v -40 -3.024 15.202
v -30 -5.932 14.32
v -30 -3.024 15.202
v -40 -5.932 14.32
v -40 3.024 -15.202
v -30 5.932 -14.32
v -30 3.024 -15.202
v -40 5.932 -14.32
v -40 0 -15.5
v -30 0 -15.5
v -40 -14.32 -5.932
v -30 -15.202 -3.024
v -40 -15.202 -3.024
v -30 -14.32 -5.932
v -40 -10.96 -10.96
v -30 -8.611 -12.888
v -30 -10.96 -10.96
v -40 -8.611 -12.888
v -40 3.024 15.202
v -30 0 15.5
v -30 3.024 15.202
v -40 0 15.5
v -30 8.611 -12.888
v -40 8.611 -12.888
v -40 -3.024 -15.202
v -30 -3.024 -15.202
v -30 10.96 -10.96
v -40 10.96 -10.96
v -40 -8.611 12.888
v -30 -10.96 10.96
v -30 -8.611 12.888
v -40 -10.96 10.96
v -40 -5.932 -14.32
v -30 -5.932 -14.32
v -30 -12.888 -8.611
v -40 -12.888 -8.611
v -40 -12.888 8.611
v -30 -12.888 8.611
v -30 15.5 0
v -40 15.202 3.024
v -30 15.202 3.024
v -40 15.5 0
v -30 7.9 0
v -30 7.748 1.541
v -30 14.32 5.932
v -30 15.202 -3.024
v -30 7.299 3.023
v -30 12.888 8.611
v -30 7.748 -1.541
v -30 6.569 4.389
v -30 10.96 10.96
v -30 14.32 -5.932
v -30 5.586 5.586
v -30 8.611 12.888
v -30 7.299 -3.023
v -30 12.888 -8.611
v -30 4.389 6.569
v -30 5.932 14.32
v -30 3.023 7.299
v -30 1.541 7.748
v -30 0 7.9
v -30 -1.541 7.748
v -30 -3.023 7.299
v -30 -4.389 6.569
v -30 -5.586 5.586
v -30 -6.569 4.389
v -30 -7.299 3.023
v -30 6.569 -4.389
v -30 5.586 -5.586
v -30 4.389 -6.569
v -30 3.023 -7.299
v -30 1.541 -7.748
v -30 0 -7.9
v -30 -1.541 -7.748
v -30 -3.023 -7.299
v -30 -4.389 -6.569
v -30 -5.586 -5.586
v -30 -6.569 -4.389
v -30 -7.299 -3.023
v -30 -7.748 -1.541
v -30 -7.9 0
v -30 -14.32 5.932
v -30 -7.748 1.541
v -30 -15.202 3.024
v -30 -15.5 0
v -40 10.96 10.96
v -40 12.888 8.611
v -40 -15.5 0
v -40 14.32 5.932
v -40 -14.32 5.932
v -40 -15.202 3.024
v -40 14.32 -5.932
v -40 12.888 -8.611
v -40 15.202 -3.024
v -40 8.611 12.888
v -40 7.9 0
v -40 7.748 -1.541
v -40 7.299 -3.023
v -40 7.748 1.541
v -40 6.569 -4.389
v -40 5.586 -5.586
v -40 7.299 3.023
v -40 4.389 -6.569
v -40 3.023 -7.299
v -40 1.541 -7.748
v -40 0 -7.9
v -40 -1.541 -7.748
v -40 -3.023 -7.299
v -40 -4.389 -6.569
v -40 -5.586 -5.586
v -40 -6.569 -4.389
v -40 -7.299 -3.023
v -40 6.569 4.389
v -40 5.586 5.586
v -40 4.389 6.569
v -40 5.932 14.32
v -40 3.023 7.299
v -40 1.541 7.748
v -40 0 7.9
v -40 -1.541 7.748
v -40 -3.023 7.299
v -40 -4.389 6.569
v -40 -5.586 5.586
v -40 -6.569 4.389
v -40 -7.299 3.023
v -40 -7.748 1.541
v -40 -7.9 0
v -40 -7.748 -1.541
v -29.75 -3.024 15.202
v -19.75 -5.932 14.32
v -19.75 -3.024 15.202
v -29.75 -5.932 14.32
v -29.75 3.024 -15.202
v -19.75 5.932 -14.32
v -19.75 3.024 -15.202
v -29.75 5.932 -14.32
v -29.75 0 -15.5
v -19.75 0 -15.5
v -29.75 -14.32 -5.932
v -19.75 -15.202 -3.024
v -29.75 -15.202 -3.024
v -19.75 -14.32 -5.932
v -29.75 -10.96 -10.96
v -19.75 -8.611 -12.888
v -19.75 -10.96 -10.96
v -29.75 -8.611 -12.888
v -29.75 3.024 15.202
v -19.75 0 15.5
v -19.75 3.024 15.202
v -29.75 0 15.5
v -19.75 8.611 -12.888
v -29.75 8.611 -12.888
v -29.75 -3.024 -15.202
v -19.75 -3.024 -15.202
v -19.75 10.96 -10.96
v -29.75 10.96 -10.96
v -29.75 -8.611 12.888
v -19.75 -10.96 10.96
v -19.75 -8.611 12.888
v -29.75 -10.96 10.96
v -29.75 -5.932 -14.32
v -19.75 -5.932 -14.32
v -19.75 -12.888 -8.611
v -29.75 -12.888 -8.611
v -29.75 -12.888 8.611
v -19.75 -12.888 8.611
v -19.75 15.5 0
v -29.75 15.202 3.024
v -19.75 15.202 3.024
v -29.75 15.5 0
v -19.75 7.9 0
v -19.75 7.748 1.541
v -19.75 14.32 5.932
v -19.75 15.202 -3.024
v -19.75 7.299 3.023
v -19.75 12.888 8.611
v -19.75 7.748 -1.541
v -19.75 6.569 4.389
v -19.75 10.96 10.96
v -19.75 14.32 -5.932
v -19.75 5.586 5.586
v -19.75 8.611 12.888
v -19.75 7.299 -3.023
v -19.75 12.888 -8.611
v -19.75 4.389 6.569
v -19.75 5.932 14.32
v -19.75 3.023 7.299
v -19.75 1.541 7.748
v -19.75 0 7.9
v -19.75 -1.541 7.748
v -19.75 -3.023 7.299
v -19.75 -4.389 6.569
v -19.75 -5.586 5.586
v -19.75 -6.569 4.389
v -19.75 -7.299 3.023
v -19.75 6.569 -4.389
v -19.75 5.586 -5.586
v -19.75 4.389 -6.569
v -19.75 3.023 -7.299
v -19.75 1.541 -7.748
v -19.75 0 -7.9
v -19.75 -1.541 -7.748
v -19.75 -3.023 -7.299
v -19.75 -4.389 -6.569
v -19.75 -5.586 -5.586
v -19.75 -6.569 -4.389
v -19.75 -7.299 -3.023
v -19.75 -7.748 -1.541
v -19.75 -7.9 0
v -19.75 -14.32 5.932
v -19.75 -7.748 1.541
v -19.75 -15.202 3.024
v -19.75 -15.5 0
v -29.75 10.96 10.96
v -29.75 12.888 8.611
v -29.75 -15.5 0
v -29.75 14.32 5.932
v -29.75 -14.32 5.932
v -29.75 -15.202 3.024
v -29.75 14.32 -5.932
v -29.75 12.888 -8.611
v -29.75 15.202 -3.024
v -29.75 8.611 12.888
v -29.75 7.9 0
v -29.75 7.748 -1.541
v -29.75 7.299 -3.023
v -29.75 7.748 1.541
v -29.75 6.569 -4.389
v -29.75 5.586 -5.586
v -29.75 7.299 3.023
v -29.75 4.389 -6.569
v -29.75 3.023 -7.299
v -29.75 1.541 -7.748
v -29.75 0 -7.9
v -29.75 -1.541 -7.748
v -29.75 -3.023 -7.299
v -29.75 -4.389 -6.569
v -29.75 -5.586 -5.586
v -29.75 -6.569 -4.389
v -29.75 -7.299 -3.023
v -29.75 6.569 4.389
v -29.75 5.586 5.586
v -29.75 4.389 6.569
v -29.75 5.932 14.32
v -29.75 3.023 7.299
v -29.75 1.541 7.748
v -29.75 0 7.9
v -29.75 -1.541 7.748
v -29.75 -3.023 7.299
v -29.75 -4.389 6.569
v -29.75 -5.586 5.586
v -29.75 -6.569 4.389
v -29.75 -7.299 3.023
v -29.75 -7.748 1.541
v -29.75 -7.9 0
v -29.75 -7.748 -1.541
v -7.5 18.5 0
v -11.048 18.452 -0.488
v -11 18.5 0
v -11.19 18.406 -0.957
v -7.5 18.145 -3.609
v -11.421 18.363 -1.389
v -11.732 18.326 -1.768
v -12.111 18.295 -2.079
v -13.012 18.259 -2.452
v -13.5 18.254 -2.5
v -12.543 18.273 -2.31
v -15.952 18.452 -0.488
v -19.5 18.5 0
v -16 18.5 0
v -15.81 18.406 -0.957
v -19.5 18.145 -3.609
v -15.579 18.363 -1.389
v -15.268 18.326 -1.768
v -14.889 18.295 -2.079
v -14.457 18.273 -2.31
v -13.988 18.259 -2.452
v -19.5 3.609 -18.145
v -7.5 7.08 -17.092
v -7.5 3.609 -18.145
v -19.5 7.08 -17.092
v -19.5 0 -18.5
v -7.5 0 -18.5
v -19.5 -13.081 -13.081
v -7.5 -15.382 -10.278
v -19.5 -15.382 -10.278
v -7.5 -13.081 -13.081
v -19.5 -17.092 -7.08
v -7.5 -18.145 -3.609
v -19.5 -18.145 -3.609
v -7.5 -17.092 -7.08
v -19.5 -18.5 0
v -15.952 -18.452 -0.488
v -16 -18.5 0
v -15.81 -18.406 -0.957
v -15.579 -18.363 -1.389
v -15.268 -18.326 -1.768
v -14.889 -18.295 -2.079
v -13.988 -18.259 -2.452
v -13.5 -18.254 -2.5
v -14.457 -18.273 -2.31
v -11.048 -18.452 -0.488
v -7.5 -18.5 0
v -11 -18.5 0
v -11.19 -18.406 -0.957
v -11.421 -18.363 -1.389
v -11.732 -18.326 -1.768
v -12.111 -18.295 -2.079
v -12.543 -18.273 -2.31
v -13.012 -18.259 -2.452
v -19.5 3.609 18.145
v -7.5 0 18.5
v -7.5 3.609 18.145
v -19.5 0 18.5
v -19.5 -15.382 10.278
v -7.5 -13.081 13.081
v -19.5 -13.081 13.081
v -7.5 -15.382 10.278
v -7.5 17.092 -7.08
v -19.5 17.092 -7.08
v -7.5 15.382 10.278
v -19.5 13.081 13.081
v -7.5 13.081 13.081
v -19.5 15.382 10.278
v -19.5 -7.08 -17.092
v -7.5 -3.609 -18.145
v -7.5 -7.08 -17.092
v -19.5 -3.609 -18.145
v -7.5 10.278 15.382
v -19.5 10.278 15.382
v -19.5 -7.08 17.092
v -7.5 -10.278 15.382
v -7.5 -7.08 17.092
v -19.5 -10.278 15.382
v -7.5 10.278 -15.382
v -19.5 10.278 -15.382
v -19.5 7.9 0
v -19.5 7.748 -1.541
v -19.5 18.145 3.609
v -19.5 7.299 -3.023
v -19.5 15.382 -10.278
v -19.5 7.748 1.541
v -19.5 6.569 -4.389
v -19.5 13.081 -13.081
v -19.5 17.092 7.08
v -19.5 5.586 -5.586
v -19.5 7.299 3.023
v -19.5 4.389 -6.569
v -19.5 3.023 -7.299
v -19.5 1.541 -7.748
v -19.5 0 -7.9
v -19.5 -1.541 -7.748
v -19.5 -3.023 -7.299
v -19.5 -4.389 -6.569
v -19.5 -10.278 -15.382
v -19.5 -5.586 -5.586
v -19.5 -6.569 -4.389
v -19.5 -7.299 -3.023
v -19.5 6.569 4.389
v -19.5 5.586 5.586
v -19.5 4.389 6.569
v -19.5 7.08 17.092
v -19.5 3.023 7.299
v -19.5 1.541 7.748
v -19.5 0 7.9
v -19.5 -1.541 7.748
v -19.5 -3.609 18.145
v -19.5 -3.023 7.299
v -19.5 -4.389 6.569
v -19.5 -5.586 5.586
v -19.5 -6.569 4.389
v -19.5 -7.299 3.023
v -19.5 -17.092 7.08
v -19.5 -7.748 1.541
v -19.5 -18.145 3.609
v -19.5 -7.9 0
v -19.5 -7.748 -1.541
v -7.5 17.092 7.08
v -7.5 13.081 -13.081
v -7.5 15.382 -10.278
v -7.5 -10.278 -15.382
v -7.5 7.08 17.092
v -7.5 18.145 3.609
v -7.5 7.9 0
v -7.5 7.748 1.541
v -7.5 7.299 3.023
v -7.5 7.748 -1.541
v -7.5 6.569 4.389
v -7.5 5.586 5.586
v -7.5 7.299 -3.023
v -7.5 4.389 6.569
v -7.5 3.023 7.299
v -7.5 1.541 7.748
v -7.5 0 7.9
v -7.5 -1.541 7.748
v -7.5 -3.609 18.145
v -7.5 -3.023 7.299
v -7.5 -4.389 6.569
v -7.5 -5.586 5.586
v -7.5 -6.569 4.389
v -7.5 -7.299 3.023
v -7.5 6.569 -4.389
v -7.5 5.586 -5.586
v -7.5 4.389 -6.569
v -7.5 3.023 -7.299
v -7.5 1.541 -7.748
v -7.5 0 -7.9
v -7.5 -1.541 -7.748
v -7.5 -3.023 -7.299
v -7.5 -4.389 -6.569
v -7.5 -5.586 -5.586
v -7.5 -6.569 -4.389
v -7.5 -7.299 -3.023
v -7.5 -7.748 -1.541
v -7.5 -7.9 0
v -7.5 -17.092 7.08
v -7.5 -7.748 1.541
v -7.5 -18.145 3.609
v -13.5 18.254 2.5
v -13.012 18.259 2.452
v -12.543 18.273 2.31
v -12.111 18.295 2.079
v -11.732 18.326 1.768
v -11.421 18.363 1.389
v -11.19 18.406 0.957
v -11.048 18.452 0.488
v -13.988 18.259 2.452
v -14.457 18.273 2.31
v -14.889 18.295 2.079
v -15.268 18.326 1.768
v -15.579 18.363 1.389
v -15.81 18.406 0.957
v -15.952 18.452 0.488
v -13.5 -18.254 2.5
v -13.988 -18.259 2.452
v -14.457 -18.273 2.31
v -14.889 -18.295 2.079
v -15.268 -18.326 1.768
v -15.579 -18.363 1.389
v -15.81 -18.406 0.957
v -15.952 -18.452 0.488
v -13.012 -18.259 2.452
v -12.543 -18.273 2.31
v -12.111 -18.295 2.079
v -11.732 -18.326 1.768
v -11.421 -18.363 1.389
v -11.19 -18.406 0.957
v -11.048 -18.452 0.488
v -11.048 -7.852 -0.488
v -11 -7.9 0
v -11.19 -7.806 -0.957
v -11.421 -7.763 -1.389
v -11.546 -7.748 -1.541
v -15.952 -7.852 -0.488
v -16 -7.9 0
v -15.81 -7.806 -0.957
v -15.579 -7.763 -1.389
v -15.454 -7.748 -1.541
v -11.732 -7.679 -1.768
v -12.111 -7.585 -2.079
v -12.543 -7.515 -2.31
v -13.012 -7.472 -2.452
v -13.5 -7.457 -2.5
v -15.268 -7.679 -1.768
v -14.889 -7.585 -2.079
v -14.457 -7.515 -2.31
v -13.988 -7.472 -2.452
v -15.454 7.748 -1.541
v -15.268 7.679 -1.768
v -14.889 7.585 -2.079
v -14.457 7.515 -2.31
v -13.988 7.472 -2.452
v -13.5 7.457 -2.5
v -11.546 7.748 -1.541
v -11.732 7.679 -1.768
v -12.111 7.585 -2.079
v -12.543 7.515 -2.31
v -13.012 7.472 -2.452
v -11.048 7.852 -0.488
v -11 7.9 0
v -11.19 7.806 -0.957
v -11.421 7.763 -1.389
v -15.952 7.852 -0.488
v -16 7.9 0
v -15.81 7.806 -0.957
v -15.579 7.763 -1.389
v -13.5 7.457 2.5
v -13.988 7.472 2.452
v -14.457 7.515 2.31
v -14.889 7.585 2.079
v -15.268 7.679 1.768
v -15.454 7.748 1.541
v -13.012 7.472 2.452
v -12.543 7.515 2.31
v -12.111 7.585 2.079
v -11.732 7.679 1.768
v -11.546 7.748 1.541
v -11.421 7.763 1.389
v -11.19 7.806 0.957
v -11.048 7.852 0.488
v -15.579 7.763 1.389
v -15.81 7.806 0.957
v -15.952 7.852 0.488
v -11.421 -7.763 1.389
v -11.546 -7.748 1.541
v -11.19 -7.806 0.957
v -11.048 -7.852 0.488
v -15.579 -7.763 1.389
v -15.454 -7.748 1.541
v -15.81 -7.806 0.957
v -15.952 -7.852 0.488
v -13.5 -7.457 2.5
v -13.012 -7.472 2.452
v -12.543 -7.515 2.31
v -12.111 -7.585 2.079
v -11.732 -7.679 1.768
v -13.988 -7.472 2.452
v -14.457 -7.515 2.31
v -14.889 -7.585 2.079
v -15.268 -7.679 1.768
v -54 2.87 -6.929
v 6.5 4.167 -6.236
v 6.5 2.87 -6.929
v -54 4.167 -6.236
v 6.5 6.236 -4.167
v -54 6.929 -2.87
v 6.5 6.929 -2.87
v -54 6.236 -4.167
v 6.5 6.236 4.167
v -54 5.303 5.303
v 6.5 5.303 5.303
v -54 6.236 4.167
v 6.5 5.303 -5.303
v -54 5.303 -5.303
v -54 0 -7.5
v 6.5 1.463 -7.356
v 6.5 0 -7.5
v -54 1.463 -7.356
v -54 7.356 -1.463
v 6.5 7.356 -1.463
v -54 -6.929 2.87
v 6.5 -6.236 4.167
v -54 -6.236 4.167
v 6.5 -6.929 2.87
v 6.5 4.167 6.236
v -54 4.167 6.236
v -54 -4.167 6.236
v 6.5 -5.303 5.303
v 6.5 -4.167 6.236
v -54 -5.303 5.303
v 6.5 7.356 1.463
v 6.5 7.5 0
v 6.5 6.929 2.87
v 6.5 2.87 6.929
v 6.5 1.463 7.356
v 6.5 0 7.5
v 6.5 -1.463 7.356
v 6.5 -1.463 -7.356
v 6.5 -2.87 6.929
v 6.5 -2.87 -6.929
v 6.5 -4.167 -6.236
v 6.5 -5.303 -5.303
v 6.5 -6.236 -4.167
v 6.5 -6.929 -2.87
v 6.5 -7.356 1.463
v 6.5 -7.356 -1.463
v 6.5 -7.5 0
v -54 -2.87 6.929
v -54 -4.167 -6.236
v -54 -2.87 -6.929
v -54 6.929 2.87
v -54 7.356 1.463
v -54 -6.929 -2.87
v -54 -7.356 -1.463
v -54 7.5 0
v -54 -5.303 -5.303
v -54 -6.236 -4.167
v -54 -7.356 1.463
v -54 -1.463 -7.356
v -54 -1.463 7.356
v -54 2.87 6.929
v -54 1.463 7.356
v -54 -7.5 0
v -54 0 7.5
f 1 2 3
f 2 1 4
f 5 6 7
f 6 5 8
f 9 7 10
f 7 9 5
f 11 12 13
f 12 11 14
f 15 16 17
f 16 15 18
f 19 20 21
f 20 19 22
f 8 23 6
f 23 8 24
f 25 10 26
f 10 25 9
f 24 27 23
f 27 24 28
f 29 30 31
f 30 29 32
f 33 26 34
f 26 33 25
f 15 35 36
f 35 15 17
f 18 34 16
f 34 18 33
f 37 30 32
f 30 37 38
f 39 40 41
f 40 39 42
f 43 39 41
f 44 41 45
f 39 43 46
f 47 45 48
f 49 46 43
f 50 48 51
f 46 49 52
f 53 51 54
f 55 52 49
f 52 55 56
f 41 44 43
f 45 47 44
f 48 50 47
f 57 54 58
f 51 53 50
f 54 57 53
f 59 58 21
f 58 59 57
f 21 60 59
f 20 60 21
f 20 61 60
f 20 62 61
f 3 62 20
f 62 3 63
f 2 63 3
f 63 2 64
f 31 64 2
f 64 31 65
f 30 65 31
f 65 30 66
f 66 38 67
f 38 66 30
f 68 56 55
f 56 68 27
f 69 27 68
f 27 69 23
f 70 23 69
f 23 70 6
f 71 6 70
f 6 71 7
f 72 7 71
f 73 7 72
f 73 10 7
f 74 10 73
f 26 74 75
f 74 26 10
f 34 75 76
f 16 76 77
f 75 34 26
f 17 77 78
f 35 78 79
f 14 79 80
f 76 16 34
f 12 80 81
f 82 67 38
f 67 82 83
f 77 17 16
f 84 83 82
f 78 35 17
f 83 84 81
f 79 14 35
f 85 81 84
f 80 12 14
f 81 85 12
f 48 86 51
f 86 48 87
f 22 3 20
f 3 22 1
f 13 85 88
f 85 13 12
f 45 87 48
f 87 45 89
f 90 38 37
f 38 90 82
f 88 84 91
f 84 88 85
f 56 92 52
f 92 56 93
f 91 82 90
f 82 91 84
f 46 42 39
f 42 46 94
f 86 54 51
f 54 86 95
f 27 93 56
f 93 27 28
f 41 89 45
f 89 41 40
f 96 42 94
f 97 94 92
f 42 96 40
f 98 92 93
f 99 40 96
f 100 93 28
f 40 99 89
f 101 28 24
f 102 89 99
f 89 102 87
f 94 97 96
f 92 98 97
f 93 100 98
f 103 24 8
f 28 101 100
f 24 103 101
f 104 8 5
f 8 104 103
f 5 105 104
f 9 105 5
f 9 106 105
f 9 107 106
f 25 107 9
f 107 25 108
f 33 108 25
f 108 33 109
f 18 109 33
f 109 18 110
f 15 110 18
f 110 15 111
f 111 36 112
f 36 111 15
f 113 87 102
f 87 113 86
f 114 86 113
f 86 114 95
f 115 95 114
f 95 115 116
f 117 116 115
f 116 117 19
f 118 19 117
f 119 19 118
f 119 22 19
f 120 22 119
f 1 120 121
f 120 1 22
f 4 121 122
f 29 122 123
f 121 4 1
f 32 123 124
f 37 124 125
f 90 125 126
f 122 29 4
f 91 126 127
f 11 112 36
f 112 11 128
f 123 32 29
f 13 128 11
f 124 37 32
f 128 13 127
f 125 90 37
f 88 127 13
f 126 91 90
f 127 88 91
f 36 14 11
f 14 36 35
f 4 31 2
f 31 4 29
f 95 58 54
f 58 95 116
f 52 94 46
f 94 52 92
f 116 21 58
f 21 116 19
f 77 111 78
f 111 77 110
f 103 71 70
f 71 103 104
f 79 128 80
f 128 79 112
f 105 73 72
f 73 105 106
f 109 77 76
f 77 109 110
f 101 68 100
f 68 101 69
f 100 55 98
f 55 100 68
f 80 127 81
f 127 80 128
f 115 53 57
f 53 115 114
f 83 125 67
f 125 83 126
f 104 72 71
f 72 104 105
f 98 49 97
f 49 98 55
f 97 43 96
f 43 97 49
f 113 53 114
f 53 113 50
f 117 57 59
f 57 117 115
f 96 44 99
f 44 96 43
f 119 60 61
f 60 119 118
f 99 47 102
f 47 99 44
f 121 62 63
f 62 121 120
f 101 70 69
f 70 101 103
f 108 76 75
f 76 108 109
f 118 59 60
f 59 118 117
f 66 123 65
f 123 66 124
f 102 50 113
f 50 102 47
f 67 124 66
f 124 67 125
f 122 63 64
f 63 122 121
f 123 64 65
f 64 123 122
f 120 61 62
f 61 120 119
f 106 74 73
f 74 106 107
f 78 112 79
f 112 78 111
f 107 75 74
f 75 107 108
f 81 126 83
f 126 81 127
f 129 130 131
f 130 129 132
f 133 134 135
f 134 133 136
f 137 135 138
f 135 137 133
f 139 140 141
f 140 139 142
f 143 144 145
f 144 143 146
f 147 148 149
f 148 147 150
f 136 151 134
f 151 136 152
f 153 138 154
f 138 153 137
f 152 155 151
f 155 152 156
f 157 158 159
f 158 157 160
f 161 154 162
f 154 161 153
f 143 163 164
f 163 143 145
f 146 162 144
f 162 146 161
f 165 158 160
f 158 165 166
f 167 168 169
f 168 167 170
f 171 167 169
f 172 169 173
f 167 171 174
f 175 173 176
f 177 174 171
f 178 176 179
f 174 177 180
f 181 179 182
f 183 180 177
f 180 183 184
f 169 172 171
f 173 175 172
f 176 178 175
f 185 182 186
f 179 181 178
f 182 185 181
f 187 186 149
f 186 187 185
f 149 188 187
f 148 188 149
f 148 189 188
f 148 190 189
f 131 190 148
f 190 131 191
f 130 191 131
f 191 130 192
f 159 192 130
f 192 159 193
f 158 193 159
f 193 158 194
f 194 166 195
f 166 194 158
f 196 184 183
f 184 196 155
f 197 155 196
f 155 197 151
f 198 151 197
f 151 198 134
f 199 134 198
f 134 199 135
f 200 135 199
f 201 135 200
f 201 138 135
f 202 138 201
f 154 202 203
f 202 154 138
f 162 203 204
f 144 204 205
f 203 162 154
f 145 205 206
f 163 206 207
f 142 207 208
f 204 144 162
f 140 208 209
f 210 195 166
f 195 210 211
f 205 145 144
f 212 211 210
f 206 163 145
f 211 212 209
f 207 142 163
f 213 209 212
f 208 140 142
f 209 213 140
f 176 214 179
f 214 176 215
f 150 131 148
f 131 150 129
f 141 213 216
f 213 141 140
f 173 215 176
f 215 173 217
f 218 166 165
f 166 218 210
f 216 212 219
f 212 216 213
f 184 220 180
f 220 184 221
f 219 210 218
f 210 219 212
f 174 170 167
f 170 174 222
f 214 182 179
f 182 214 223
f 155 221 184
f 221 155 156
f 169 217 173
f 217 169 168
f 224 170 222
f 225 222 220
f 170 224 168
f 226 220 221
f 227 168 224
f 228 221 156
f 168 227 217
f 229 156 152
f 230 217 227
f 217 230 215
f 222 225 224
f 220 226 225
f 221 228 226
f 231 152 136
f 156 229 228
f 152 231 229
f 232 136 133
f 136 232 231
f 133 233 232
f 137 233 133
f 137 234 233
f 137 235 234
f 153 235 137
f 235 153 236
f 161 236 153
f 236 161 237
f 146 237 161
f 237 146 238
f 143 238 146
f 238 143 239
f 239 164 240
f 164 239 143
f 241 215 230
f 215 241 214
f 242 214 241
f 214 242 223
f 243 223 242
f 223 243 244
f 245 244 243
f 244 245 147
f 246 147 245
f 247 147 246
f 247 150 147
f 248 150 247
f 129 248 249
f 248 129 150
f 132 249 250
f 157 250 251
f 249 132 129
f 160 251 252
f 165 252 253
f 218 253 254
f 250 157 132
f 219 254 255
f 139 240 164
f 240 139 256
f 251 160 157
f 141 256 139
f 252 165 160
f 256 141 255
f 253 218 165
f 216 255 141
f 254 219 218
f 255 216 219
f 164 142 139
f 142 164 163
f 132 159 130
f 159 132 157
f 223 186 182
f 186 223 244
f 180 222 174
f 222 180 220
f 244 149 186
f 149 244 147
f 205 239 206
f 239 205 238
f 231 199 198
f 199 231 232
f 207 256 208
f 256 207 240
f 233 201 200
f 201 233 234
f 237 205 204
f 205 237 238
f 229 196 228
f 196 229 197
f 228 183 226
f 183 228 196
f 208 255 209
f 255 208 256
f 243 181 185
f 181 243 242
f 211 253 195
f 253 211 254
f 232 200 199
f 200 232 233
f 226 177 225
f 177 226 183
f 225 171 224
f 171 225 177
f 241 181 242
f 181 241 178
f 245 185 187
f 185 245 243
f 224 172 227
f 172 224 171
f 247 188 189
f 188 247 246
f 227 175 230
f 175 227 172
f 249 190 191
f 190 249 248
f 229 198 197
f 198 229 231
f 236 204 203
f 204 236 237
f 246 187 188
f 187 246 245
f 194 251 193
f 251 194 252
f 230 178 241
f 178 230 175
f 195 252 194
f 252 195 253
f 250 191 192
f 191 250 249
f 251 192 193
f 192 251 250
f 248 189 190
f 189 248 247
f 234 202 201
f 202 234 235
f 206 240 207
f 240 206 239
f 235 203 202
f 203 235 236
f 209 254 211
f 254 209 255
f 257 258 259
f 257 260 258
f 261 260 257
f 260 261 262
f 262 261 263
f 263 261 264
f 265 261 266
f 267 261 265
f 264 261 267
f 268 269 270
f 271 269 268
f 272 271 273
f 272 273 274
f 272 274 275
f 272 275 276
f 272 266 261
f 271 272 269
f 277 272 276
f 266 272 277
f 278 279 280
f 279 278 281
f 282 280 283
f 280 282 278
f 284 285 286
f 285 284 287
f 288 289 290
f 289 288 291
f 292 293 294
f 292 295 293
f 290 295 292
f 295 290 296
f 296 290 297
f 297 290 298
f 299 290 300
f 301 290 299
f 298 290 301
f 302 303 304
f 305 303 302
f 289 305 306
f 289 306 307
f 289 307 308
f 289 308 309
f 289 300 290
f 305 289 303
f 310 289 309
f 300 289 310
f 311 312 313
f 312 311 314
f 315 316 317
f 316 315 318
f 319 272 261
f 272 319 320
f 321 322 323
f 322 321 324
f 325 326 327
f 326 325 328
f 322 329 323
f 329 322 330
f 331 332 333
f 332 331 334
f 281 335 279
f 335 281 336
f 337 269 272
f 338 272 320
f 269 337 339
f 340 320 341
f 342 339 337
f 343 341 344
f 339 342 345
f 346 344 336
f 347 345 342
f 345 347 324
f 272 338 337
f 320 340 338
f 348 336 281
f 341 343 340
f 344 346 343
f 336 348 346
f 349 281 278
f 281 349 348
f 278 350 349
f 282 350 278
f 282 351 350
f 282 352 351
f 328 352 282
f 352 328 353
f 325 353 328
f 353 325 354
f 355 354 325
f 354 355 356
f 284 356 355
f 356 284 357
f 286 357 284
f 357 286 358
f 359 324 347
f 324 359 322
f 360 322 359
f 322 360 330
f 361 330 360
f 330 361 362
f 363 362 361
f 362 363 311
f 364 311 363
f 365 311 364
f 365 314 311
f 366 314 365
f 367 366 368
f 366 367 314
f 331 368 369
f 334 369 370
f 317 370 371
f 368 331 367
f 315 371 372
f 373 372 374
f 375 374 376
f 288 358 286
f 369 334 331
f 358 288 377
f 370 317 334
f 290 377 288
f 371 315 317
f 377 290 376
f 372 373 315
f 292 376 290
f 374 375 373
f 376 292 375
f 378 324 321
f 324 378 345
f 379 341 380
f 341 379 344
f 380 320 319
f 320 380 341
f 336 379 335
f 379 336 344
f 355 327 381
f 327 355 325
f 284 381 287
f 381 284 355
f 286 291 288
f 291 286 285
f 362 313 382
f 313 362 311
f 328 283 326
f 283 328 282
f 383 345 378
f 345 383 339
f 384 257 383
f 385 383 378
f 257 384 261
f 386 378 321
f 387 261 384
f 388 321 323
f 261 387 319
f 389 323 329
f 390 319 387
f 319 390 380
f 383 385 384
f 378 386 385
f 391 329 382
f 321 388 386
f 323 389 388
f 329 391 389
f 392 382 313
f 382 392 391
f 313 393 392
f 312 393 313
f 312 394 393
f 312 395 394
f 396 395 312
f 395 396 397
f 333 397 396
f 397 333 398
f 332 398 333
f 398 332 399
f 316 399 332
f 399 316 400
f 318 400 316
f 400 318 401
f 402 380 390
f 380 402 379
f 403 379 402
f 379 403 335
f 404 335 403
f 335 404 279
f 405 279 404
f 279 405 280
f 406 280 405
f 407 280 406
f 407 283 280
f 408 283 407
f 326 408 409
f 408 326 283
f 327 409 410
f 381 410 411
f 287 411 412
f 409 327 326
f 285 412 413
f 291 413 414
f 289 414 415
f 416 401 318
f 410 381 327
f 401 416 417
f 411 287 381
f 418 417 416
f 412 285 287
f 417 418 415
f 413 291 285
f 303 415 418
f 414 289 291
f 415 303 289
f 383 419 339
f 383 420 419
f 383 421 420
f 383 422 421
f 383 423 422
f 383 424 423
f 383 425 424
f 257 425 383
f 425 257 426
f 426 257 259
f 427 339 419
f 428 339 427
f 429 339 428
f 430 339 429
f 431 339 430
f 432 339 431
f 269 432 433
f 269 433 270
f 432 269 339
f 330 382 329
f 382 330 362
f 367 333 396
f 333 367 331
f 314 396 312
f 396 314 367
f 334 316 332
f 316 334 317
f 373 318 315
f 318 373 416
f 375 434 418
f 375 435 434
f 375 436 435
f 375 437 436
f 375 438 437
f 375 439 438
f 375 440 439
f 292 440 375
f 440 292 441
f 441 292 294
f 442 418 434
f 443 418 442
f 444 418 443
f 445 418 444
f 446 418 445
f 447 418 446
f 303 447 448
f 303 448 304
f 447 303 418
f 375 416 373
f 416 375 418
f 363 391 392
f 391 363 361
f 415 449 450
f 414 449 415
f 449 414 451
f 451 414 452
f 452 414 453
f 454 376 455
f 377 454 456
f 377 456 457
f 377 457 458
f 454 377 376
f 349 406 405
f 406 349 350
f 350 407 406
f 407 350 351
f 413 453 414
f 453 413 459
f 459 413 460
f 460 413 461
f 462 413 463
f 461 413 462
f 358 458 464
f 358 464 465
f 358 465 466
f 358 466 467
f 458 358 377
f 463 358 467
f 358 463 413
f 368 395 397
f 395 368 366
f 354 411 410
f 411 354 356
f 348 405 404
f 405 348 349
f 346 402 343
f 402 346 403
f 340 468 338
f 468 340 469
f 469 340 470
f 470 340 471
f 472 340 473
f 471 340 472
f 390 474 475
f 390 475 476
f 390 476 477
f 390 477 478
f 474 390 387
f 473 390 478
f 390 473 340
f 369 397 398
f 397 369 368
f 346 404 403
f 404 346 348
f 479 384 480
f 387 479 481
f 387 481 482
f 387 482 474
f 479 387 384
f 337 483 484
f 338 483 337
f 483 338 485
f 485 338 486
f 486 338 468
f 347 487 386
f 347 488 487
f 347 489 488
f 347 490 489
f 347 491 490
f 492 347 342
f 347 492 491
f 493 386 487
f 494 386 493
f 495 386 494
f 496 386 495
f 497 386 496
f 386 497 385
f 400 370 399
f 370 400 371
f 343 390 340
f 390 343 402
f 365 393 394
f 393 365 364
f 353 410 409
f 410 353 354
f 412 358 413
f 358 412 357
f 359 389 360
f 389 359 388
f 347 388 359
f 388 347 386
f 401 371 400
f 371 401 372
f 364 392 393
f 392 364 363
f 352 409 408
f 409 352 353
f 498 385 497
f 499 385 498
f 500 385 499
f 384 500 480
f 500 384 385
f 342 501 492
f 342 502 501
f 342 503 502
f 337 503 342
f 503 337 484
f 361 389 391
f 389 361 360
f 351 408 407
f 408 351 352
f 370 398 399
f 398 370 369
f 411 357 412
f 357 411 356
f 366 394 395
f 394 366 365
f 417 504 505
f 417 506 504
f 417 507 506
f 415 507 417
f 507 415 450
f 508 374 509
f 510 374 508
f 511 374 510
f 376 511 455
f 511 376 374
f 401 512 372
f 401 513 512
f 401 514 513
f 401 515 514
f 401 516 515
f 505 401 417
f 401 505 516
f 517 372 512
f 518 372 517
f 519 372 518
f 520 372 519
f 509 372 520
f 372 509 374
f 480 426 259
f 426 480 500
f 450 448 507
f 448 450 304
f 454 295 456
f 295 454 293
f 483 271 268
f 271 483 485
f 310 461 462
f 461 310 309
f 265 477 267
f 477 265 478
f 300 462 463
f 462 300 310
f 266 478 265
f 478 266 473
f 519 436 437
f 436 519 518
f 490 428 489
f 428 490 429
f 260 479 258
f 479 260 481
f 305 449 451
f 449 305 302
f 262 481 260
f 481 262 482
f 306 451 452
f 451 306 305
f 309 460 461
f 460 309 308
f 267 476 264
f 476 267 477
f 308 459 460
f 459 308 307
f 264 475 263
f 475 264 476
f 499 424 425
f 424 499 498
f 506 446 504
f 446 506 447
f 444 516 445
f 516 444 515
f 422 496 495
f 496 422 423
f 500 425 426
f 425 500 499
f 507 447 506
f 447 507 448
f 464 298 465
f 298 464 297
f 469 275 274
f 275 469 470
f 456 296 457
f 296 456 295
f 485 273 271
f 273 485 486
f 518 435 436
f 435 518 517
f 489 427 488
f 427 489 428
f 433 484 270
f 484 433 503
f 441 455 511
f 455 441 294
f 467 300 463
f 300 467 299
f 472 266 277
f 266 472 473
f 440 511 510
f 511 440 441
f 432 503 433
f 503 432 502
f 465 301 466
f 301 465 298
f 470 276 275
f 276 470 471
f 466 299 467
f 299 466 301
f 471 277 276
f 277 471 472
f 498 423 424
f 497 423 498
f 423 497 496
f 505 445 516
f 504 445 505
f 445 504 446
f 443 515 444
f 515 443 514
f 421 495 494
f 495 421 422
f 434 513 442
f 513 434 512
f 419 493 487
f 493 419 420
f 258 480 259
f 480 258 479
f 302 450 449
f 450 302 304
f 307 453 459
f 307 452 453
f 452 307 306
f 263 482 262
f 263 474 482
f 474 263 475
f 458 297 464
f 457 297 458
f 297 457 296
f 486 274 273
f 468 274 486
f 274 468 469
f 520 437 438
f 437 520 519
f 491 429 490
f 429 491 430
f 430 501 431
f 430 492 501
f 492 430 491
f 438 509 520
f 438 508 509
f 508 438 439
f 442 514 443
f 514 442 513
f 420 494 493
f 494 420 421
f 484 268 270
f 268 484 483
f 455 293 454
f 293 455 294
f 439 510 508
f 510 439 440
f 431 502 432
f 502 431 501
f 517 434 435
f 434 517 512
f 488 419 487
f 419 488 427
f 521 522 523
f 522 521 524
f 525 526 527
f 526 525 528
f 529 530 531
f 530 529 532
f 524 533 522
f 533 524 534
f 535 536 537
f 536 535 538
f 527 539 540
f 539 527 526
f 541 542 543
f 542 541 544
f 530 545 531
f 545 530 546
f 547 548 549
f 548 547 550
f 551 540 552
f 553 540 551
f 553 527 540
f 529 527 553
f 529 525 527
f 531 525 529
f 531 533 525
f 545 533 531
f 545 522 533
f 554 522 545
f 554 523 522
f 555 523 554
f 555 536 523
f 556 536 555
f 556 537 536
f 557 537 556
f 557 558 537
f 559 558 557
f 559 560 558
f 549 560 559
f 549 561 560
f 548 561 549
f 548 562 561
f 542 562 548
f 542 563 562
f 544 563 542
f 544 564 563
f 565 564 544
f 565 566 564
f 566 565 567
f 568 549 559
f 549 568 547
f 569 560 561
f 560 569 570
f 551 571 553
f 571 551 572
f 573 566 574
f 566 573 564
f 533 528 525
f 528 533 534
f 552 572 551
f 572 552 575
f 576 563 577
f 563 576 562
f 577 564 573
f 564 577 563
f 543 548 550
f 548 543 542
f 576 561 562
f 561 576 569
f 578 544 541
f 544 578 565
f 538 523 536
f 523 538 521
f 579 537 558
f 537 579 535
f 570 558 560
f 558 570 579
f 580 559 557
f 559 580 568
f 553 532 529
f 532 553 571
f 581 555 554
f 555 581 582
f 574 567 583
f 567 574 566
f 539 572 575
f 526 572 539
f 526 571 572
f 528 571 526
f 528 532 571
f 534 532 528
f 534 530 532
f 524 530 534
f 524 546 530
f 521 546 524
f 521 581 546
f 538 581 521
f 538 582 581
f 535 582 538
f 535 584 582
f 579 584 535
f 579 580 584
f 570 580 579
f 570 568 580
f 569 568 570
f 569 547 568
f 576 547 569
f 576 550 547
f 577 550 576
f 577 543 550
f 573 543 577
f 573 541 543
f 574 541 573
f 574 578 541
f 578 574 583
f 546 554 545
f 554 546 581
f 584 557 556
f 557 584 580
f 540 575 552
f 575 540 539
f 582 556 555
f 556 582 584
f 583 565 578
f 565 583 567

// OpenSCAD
$fn = 32;

// ------------------------------------------------------------------------
// Shaft with rings and collars: d15 shaft, 3 rings
// Every part is its own module, assembly() places them once.
// ------------------------------------------------------------------------

// --- part 1 ---
module shaft() {
  translate([0, 0, -30.25]) cylinder(h = 60.5, d = 15);
}

// --- part 2 ---
module spacer_a() {
  difference() {
      translate([0, 0, 0]) cylinder(h = 10, d = 31);
      translate([0, 0, -1]) cylinder(h = 12, d = 15.8);
    }
}

// --- part 3 ---
module spacer_b() {
  difference() {
      translate([0, 0, 0]) cylinder(h = 10, d = 31);
      translate([0, 0, -1]) cylinder(h = 12, d = 15.8);
    }
}

// --- part 4 ---
module collar_a() {
  difference() {
    cylinder(h = 12, d = 37);
    translate([0, 0, -1]) cylinder(h = 14, d = 15.8);
    translate([0, 0, 6]) rotate([90, 0, 0]) cylinder(h = 39, d = 5, center = true);
  }
}

// --- assembly ---
module assembly() {
  translate([-23.75, 0, 0]) rotate([0, 90, 0]) shaft();
  translate([-40, 0, 0]) rotate([0, 90, 0]) spacer_a();
  translate([-29.75, 0, 0]) rotate([0, 90, 0]) spacer_b();
  translate([-19.5, 0, 0]) rotate([0, 90, 0]) collar_a();
}

assembly();
